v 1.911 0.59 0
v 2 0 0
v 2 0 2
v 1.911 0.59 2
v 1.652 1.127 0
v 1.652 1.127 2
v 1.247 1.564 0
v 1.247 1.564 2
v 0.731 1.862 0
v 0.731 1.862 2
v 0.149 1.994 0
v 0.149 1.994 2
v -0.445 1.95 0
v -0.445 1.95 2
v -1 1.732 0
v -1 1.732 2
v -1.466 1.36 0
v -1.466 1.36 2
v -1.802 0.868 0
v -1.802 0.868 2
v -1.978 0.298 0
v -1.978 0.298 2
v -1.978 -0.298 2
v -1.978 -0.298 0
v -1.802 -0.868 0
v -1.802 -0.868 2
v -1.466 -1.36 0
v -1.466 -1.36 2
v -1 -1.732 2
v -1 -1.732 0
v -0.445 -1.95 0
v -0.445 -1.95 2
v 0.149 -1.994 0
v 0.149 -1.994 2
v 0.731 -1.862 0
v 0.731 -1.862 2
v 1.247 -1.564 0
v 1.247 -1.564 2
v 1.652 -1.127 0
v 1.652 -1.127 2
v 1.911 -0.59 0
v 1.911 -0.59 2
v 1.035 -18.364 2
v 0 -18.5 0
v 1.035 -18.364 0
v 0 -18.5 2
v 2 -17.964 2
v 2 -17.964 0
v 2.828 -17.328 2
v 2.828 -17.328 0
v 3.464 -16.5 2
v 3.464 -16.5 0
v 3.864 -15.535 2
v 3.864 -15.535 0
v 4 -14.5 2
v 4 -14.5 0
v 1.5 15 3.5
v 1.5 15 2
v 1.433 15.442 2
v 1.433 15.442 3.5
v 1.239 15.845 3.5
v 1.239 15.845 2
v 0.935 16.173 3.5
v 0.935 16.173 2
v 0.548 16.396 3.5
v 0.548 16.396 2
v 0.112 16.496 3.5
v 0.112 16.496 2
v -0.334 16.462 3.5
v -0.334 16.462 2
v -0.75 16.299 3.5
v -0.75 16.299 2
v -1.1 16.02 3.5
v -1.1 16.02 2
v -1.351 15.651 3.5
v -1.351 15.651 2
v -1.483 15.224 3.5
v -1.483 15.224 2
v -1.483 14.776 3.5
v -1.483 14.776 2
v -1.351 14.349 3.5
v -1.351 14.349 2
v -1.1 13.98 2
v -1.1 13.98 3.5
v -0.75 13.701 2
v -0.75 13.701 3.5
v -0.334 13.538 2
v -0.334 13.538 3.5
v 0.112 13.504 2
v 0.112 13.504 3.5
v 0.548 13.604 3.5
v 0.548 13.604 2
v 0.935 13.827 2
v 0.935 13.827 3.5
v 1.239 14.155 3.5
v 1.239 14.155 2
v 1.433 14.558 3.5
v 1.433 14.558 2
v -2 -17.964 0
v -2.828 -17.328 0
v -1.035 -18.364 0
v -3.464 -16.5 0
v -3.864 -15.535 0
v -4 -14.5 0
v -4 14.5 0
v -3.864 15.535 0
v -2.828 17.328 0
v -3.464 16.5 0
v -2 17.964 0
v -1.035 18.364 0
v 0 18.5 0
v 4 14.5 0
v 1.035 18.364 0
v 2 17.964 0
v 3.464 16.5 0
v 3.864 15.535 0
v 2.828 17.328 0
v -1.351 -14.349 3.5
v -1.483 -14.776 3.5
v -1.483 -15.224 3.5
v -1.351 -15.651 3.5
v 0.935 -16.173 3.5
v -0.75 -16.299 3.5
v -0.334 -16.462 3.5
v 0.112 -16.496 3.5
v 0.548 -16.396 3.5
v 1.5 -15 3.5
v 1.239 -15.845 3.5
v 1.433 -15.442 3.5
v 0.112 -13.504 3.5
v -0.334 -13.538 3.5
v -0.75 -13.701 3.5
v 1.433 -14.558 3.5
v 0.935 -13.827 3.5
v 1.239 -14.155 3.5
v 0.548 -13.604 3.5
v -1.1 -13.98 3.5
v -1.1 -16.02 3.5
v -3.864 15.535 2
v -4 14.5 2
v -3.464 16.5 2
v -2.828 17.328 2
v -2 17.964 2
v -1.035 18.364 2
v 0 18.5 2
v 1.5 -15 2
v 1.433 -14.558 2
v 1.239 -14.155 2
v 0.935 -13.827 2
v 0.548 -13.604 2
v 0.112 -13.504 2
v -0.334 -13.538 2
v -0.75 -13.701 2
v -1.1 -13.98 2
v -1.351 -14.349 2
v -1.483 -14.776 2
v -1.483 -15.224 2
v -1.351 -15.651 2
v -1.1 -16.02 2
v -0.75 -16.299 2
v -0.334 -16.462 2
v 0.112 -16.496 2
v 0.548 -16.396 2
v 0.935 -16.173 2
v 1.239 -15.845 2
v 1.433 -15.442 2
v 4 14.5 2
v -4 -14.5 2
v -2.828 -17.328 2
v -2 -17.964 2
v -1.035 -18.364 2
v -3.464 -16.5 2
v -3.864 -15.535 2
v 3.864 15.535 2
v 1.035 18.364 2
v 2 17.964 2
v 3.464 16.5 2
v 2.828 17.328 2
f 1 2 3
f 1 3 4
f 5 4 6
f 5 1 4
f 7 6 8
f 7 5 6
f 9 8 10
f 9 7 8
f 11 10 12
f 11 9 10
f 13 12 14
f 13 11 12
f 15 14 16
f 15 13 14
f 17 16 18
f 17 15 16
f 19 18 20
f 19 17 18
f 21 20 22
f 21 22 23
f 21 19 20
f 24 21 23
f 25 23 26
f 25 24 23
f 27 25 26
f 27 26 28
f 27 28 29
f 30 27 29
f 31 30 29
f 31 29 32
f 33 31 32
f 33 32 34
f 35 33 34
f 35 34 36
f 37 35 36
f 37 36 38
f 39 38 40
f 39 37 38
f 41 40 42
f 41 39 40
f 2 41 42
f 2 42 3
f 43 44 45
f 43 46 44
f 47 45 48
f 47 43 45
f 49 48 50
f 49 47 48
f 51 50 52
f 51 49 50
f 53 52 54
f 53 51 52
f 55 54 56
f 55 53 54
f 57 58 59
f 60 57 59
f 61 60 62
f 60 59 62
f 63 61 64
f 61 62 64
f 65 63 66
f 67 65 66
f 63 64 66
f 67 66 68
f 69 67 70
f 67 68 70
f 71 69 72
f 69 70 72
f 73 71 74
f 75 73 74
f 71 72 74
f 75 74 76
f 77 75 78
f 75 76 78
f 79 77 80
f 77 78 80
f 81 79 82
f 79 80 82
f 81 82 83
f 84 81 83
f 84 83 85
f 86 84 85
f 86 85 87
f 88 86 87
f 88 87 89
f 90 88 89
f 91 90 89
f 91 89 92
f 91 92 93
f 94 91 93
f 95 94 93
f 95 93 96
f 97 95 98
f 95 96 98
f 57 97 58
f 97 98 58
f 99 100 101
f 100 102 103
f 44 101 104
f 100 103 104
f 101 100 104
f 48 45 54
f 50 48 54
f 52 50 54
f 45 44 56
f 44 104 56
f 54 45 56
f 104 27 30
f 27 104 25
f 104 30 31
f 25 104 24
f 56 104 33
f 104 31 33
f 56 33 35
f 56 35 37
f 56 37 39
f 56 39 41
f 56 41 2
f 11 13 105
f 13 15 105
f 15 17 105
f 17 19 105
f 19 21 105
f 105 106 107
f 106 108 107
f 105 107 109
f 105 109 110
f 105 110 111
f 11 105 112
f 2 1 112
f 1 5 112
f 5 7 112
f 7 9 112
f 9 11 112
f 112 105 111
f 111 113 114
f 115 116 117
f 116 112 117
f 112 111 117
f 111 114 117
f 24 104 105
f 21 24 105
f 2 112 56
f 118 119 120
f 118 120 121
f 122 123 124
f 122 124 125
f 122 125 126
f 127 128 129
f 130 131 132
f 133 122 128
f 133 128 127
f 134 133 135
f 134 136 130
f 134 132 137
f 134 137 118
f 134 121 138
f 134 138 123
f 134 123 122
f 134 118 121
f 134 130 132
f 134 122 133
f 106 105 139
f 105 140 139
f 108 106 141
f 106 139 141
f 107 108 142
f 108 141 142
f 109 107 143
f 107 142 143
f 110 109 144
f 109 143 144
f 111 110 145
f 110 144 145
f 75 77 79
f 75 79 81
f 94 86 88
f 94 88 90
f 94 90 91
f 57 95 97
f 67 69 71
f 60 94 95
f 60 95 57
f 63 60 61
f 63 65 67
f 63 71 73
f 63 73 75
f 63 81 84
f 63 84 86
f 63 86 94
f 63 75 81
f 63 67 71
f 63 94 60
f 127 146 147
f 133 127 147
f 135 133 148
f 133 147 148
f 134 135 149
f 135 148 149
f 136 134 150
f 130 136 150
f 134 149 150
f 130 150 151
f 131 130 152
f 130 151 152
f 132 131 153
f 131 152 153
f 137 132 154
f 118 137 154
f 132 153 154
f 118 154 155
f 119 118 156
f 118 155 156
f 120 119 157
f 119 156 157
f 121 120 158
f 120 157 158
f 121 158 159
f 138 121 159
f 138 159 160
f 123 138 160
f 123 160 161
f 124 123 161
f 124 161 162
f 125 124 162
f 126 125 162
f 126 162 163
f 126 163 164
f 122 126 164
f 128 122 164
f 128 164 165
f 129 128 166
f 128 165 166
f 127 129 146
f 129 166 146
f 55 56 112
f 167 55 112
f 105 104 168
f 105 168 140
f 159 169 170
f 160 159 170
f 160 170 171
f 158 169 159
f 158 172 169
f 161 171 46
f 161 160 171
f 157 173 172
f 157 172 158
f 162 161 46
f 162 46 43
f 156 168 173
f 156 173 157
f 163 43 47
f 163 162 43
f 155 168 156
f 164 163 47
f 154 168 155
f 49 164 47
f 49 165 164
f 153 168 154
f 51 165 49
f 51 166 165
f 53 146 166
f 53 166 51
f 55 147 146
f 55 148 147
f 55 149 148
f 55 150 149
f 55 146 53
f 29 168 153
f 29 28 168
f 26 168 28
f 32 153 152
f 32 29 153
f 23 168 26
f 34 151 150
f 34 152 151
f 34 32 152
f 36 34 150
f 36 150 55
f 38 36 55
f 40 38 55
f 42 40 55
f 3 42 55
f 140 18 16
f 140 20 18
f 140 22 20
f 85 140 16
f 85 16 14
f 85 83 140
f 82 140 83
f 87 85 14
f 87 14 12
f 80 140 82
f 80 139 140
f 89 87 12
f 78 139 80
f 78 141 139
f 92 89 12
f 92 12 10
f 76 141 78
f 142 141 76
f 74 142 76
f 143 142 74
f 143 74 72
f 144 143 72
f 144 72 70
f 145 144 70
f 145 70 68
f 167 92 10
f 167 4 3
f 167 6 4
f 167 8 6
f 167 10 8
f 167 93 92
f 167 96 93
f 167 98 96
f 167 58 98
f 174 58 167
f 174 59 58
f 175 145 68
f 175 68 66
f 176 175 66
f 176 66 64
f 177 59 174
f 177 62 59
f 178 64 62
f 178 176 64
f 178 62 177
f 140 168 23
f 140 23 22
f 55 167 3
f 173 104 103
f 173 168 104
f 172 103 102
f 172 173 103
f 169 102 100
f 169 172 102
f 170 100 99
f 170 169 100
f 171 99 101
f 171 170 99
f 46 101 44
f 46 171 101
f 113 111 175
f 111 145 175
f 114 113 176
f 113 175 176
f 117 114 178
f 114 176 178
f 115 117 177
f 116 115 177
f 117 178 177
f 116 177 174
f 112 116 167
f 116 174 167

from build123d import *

# Parameters (mm, degrees)
F0_W     = 8
F0_H     = 37
F0_R     = 2
F1_DEPTH = 2
F2_R     = 1.5
F3_DEPTH = 1.5
F4_R     = 3.99999


# Not quite as in the source:
# - a fillet or chamfer is up to 0.001 mm smaller than in the source, because OpenCascade refuses the exact size


with BuildPart() as f1:
    # F0 (on Top) → F1 (new body)
    with BuildSketch(Plane.XY):
        Rectangle(F0_W, F0_H)
        Circle(F0_R, mode=Mode.SUBTRACT)
    extrude(amount=F1_DEPTH)

    # F2 (on face) → F3 (join)
    with BuildSketch(Plane.XY.offset(2)):
        with Locations((0, 15)):
            Circle(F2_R)
        with Locations((0, -15)):
            Circle(F2_R)
    extrude(amount=F3_DEPTH)

    # F4 (radius 4 in the source; OpenCascade refuses exactly that, so slightly less here)
    f4_edges = [f1.edges().sort_by_distance(p)[0] for p in [
        (-4, 18.5, 1),
        (4, 18.5, 1),
        (4, -18.5, 1),
        (-4, -18.5, 1),
    ]]
    fillet(f4_edges, radius=F4_R)


solid = f1.part
